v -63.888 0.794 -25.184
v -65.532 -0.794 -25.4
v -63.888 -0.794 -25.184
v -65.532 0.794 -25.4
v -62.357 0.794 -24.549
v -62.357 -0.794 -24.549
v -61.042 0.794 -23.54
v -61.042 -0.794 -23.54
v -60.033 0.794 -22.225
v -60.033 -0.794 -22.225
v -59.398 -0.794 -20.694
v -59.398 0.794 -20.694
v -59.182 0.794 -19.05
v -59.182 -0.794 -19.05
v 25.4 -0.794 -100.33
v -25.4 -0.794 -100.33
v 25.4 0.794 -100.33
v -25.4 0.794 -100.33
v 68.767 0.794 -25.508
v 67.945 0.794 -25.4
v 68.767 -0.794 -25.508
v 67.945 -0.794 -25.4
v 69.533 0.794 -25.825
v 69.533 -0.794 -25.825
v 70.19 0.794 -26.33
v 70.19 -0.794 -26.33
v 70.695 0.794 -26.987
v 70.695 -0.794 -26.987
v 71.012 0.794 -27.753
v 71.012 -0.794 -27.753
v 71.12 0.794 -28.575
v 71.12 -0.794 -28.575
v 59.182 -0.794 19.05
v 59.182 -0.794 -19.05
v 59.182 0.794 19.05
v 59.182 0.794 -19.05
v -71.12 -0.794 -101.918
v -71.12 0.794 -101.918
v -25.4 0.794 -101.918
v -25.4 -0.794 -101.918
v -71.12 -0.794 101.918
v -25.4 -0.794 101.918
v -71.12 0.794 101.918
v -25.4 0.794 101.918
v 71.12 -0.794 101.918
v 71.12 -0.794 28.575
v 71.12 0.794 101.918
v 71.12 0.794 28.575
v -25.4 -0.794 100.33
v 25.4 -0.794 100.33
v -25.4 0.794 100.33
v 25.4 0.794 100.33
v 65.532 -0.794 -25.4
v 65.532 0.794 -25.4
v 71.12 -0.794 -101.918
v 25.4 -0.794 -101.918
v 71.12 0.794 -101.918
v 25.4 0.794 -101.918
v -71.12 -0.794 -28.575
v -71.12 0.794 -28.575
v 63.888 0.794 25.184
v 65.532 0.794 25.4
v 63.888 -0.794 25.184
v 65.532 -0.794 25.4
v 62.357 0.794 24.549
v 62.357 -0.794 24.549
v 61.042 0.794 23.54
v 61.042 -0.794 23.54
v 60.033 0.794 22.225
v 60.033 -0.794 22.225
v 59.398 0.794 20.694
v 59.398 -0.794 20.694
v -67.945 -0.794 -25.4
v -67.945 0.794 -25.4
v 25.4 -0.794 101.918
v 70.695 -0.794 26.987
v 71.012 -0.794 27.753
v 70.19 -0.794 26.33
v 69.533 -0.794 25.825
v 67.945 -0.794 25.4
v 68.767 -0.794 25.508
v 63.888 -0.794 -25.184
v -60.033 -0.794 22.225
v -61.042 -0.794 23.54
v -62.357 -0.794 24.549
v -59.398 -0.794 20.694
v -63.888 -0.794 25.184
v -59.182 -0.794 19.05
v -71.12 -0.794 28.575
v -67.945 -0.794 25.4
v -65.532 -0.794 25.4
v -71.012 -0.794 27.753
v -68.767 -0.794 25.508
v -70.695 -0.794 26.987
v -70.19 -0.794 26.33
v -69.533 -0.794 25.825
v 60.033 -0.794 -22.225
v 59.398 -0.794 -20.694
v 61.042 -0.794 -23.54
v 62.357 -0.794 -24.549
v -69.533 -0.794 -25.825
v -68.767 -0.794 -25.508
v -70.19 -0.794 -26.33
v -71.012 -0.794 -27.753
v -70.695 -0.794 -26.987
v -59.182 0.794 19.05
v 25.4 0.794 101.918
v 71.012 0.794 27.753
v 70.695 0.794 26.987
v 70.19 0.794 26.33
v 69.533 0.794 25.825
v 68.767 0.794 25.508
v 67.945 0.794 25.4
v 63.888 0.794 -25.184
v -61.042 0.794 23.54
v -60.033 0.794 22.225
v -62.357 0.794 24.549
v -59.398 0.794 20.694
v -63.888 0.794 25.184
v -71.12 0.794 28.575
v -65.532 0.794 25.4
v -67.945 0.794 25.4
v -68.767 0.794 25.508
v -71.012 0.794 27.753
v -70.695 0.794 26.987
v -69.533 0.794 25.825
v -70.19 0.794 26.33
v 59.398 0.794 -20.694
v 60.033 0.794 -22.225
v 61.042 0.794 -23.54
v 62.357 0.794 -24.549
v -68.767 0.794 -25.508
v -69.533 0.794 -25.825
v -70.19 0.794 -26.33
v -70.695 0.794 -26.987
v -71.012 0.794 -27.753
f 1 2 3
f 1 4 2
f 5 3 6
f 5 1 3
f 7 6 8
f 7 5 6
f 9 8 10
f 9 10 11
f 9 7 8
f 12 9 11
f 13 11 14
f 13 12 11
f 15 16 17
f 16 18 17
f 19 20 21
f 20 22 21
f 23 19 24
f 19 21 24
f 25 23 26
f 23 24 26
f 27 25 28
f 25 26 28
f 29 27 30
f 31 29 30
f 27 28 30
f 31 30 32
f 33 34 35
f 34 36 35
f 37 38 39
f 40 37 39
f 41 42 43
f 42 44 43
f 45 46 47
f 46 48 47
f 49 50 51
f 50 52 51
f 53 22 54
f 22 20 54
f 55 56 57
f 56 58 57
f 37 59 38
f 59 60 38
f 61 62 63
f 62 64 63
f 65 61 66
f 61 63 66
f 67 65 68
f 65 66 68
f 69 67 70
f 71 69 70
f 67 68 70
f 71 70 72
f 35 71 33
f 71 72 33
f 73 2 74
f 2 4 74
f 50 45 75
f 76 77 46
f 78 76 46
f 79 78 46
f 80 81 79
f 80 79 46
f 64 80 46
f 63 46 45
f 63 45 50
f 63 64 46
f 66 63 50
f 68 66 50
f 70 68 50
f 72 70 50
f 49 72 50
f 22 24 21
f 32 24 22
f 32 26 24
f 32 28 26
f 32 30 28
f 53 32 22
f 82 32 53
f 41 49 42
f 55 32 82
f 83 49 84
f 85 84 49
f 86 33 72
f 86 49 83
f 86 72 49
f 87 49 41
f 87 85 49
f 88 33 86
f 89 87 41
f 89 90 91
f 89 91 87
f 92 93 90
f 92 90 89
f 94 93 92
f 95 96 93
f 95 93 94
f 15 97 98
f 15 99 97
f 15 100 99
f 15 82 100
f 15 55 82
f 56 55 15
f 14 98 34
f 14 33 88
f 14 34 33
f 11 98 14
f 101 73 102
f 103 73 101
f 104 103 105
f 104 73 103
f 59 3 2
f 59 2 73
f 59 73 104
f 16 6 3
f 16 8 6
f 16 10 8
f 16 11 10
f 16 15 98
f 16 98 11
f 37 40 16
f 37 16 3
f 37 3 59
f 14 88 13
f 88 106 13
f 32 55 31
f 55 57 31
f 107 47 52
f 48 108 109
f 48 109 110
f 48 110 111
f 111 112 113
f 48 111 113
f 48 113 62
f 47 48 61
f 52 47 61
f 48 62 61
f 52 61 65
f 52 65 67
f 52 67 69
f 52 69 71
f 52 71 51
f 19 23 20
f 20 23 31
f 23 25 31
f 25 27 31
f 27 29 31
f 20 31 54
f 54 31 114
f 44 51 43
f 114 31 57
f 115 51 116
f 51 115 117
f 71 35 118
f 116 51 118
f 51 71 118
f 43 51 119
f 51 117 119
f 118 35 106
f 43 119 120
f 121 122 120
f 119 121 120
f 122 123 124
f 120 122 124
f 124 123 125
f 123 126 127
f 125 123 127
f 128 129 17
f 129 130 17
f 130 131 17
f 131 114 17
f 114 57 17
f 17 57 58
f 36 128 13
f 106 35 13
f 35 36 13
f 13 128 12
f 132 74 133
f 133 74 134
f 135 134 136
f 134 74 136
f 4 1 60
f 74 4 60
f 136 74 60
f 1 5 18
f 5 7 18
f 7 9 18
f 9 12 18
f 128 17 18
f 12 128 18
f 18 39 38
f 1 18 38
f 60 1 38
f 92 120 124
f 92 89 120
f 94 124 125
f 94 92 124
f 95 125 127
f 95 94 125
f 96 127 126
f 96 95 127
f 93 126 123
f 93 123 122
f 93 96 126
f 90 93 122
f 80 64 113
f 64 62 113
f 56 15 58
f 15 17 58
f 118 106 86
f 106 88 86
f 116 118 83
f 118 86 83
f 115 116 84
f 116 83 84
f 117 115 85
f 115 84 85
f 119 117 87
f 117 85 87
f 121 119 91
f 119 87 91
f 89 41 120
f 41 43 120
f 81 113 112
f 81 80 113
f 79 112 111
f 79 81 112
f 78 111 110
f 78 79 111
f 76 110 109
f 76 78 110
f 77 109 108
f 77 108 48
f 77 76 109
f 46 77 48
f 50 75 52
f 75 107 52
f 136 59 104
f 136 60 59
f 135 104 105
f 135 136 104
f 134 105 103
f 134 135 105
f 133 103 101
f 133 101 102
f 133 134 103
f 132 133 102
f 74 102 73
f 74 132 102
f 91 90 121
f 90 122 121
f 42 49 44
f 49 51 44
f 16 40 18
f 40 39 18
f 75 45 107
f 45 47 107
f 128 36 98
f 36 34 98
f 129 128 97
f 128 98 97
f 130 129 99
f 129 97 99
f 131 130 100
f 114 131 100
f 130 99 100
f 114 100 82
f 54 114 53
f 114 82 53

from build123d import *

# Parameters (mm, degrees)
BOSS_EXTRUDE1_DEPTH = 0.79375
FILLET2_R           = 6.35
FILLET3_R           = 3.175


with BuildPart() as part:
    # Sketch1 → Boss-Extrude1 (new body, symmetric)
    with BuildSketch(Plane(origin=(0, 0, 0), x_dir=(1, 0, 0), z_dir=(0, 1, 0))):
        Polygon((-71.12, 101.9175), (-25.4, 101.9175), (-25.4, 100.33), (25.4, 100.33), (25.4, 101.9175), (71.12, 101.9175), (71.12, 25.4), (59.182, 25.4), (59.182, -25.4), (71.12, -25.4), (71.12, -101.9175), (25.4, -101.9175), (25.4, -100.33), (-25.4, -100.33), (-25.4, -101.9175), (-71.12, -101.9175), (-71.12, -25.4), (-59.182, -25.4), (-59.182, 25.4), (-71.12, 25.4), align=None)
    extrude(amount=BOSS_EXTRUDE1_DEPTH, both=True)

    # Fillet2
    fillet2_edges = [part.edges().sort_by_distance(p)[0] for p in [
        (59.182, 0, -25.4),
        (59.182, 0, 25.4),
        (-59.182, 0, 25.4),
        (-59.182, 0, -25.4),
    ]]
    fillet(fillet2_edges, radius=FILLET2_R)

    # Fillet3
    fillet3_edges = [part.edges().sort_by_distance(p)[0] for p in [
        (71.12, 0, -25.4),
        (71.12, 0, 25.4),
        (-71.12, 0, 25.4),
        (-71.12, 0, -25.4),
    ]]
    fillet(fillet3_edges, radius=FILLET3_R)


solid = part.part
